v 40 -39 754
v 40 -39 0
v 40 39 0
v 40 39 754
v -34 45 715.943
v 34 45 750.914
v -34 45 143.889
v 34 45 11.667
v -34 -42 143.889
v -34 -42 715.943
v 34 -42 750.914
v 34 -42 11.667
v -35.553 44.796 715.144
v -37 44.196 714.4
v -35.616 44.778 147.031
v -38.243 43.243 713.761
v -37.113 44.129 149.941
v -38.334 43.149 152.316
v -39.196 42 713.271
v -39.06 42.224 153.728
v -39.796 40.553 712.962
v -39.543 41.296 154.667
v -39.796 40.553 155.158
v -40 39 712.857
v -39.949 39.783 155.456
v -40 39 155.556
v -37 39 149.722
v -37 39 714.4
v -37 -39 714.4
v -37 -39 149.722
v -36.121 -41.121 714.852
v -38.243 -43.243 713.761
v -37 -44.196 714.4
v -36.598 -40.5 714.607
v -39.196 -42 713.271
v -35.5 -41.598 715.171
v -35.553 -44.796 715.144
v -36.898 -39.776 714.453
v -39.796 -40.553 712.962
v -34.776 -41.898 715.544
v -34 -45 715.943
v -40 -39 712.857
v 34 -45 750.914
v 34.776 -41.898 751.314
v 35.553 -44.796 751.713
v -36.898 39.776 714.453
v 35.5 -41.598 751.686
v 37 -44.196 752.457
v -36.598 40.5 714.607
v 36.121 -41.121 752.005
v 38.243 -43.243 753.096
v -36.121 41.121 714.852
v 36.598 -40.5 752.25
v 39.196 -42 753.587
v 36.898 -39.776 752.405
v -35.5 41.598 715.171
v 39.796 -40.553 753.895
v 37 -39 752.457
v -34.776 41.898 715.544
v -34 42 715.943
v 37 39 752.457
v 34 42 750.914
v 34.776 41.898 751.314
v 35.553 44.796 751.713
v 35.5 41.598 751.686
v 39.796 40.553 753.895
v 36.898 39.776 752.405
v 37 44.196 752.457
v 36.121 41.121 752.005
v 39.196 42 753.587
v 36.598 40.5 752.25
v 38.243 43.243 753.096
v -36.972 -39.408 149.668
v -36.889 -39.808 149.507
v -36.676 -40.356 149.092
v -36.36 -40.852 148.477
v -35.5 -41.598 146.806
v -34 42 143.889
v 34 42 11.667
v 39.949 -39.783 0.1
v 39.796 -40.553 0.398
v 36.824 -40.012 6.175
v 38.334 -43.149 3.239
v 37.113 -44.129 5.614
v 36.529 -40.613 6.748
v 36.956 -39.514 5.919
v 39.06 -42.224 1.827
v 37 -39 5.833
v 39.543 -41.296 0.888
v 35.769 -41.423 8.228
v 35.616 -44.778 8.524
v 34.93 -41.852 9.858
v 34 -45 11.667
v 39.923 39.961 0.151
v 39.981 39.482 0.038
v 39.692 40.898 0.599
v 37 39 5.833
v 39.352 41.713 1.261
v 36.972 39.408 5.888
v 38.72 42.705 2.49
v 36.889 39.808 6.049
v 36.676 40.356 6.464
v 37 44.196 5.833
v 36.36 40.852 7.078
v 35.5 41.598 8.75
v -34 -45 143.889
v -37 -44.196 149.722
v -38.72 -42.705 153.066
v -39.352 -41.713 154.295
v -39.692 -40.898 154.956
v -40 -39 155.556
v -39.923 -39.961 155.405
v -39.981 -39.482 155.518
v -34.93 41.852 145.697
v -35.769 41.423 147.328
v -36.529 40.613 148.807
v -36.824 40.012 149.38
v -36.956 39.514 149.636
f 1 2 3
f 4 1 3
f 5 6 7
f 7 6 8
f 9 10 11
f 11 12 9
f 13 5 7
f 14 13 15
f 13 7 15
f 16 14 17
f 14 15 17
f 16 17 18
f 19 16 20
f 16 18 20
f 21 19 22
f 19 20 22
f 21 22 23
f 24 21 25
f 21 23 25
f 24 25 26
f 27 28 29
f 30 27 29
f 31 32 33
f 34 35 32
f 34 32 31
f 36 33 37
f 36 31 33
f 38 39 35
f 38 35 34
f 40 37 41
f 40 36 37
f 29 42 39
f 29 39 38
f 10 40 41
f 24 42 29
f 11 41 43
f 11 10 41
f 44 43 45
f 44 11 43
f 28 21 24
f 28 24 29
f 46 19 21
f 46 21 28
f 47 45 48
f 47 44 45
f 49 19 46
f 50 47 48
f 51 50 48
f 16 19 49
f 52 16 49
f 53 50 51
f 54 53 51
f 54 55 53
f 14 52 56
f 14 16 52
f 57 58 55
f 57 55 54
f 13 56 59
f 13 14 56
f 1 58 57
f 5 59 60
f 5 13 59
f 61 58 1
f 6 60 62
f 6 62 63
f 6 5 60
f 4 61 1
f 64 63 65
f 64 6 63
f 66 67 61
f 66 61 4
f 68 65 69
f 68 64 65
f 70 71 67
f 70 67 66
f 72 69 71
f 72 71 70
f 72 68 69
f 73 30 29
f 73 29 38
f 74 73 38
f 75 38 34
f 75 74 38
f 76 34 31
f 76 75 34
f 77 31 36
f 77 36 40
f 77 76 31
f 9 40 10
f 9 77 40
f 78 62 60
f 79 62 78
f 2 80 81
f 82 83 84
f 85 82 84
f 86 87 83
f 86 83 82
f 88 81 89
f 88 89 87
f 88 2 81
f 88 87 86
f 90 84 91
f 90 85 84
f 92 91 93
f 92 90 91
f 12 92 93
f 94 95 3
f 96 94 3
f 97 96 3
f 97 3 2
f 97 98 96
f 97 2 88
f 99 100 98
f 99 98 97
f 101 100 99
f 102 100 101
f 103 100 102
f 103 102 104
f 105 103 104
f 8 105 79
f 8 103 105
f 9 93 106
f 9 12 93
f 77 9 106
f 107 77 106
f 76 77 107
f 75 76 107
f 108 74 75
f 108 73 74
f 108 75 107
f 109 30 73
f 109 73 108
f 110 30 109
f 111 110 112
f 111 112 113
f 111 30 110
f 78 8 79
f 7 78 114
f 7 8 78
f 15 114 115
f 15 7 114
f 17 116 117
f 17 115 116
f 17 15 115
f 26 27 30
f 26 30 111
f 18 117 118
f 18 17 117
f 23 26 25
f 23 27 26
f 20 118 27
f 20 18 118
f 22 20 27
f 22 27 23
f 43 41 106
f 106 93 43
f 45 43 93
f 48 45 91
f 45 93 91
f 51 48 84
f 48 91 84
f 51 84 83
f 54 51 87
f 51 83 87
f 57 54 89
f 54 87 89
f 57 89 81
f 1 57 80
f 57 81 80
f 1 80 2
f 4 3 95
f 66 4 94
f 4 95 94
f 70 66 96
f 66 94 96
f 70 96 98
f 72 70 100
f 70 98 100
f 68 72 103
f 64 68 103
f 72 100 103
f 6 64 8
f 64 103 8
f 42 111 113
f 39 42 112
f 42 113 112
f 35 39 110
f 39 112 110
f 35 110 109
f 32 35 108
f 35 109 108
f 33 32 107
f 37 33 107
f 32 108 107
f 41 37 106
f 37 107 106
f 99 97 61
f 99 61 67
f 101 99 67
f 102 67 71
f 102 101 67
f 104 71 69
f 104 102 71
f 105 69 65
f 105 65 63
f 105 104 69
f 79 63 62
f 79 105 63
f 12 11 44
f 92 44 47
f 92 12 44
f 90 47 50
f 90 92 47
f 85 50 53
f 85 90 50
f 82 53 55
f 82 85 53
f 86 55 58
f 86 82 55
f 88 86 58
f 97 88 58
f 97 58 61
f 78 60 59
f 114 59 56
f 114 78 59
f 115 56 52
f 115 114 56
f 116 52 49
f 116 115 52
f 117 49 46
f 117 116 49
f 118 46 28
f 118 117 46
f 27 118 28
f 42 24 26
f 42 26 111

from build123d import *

# Parameters (mm, degrees)
EXTRUDE_1_DEPTH     = 754
CUT_EXTRUDE_1_DEPTH = 60


with BuildPart() as part:
    # Эскиз1 → Вытянуть-Тонкостенный1 (new body)
    with BuildSketch(Plane.XY):
        with BuildLine():
            Line((-40, 39), (-40, -39))
            ThreePointArc((-40, -39), (-38.242640687, -43.242640687), (-34, -45))
            Line((-34, -45), (34, -45))
            ThreePointArc((34, -45), (38.242640687, -43.242640687), (40, -39))
            Line((40, -39), (40, 39))
            ThreePointArc((40, 39), (38.242640687, 43.242640687), (34, 45))
            Line((34, 45), (-34, 45))
            ThreePointArc((-34, 45), (-38.242640687, 43.242640687), (-40, 39))
        make_face()
        with BuildLine():
            Line((-37, 39), (-37, -39))
            ThreePointArc((-37, -39), (-36.121320344, -41.121320344), (-34, -42))
            Line((-34, -42), (34, -42))
            ThreePointArc((34, -42), (36.121320344, -41.121320344), (37, -39))
            Line((37, -39), (37, 39))
            ThreePointArc((37, 39), (36.121320344, 41.121320344), (34, 42))
            Line((34, 42), (-34, 42))
            ThreePointArc((-34, 42), (-36.121320344, 41.121320344), (-37, 39))
        make_face(mode=Mode.SUBTRACT)
    extrude(amount=EXTRUDE_1_DEPTH)

    # Эскиз2 → Вырез-Вытянуть1 (cut, symmetric)
    with BuildSketch(Plane(origin=(0, 0, 0), x_dir=(1, 0, 0), z_dir=(0, 1, 0))):
        Polygon((40, 0), (-40, -155.555555538), (-177.752070978, 72.913369191), (175.578140708, 72.913369191), (175.578140708, -903.068684068), (-185.164592902, -903.068684068), (-40, -712.857142852), (40, -754), align=None)
    extrude(amount=CUT_EXTRUDE_1_DEPTH, both=True, mode=Mode.SUBTRACT)


solid = part.part
